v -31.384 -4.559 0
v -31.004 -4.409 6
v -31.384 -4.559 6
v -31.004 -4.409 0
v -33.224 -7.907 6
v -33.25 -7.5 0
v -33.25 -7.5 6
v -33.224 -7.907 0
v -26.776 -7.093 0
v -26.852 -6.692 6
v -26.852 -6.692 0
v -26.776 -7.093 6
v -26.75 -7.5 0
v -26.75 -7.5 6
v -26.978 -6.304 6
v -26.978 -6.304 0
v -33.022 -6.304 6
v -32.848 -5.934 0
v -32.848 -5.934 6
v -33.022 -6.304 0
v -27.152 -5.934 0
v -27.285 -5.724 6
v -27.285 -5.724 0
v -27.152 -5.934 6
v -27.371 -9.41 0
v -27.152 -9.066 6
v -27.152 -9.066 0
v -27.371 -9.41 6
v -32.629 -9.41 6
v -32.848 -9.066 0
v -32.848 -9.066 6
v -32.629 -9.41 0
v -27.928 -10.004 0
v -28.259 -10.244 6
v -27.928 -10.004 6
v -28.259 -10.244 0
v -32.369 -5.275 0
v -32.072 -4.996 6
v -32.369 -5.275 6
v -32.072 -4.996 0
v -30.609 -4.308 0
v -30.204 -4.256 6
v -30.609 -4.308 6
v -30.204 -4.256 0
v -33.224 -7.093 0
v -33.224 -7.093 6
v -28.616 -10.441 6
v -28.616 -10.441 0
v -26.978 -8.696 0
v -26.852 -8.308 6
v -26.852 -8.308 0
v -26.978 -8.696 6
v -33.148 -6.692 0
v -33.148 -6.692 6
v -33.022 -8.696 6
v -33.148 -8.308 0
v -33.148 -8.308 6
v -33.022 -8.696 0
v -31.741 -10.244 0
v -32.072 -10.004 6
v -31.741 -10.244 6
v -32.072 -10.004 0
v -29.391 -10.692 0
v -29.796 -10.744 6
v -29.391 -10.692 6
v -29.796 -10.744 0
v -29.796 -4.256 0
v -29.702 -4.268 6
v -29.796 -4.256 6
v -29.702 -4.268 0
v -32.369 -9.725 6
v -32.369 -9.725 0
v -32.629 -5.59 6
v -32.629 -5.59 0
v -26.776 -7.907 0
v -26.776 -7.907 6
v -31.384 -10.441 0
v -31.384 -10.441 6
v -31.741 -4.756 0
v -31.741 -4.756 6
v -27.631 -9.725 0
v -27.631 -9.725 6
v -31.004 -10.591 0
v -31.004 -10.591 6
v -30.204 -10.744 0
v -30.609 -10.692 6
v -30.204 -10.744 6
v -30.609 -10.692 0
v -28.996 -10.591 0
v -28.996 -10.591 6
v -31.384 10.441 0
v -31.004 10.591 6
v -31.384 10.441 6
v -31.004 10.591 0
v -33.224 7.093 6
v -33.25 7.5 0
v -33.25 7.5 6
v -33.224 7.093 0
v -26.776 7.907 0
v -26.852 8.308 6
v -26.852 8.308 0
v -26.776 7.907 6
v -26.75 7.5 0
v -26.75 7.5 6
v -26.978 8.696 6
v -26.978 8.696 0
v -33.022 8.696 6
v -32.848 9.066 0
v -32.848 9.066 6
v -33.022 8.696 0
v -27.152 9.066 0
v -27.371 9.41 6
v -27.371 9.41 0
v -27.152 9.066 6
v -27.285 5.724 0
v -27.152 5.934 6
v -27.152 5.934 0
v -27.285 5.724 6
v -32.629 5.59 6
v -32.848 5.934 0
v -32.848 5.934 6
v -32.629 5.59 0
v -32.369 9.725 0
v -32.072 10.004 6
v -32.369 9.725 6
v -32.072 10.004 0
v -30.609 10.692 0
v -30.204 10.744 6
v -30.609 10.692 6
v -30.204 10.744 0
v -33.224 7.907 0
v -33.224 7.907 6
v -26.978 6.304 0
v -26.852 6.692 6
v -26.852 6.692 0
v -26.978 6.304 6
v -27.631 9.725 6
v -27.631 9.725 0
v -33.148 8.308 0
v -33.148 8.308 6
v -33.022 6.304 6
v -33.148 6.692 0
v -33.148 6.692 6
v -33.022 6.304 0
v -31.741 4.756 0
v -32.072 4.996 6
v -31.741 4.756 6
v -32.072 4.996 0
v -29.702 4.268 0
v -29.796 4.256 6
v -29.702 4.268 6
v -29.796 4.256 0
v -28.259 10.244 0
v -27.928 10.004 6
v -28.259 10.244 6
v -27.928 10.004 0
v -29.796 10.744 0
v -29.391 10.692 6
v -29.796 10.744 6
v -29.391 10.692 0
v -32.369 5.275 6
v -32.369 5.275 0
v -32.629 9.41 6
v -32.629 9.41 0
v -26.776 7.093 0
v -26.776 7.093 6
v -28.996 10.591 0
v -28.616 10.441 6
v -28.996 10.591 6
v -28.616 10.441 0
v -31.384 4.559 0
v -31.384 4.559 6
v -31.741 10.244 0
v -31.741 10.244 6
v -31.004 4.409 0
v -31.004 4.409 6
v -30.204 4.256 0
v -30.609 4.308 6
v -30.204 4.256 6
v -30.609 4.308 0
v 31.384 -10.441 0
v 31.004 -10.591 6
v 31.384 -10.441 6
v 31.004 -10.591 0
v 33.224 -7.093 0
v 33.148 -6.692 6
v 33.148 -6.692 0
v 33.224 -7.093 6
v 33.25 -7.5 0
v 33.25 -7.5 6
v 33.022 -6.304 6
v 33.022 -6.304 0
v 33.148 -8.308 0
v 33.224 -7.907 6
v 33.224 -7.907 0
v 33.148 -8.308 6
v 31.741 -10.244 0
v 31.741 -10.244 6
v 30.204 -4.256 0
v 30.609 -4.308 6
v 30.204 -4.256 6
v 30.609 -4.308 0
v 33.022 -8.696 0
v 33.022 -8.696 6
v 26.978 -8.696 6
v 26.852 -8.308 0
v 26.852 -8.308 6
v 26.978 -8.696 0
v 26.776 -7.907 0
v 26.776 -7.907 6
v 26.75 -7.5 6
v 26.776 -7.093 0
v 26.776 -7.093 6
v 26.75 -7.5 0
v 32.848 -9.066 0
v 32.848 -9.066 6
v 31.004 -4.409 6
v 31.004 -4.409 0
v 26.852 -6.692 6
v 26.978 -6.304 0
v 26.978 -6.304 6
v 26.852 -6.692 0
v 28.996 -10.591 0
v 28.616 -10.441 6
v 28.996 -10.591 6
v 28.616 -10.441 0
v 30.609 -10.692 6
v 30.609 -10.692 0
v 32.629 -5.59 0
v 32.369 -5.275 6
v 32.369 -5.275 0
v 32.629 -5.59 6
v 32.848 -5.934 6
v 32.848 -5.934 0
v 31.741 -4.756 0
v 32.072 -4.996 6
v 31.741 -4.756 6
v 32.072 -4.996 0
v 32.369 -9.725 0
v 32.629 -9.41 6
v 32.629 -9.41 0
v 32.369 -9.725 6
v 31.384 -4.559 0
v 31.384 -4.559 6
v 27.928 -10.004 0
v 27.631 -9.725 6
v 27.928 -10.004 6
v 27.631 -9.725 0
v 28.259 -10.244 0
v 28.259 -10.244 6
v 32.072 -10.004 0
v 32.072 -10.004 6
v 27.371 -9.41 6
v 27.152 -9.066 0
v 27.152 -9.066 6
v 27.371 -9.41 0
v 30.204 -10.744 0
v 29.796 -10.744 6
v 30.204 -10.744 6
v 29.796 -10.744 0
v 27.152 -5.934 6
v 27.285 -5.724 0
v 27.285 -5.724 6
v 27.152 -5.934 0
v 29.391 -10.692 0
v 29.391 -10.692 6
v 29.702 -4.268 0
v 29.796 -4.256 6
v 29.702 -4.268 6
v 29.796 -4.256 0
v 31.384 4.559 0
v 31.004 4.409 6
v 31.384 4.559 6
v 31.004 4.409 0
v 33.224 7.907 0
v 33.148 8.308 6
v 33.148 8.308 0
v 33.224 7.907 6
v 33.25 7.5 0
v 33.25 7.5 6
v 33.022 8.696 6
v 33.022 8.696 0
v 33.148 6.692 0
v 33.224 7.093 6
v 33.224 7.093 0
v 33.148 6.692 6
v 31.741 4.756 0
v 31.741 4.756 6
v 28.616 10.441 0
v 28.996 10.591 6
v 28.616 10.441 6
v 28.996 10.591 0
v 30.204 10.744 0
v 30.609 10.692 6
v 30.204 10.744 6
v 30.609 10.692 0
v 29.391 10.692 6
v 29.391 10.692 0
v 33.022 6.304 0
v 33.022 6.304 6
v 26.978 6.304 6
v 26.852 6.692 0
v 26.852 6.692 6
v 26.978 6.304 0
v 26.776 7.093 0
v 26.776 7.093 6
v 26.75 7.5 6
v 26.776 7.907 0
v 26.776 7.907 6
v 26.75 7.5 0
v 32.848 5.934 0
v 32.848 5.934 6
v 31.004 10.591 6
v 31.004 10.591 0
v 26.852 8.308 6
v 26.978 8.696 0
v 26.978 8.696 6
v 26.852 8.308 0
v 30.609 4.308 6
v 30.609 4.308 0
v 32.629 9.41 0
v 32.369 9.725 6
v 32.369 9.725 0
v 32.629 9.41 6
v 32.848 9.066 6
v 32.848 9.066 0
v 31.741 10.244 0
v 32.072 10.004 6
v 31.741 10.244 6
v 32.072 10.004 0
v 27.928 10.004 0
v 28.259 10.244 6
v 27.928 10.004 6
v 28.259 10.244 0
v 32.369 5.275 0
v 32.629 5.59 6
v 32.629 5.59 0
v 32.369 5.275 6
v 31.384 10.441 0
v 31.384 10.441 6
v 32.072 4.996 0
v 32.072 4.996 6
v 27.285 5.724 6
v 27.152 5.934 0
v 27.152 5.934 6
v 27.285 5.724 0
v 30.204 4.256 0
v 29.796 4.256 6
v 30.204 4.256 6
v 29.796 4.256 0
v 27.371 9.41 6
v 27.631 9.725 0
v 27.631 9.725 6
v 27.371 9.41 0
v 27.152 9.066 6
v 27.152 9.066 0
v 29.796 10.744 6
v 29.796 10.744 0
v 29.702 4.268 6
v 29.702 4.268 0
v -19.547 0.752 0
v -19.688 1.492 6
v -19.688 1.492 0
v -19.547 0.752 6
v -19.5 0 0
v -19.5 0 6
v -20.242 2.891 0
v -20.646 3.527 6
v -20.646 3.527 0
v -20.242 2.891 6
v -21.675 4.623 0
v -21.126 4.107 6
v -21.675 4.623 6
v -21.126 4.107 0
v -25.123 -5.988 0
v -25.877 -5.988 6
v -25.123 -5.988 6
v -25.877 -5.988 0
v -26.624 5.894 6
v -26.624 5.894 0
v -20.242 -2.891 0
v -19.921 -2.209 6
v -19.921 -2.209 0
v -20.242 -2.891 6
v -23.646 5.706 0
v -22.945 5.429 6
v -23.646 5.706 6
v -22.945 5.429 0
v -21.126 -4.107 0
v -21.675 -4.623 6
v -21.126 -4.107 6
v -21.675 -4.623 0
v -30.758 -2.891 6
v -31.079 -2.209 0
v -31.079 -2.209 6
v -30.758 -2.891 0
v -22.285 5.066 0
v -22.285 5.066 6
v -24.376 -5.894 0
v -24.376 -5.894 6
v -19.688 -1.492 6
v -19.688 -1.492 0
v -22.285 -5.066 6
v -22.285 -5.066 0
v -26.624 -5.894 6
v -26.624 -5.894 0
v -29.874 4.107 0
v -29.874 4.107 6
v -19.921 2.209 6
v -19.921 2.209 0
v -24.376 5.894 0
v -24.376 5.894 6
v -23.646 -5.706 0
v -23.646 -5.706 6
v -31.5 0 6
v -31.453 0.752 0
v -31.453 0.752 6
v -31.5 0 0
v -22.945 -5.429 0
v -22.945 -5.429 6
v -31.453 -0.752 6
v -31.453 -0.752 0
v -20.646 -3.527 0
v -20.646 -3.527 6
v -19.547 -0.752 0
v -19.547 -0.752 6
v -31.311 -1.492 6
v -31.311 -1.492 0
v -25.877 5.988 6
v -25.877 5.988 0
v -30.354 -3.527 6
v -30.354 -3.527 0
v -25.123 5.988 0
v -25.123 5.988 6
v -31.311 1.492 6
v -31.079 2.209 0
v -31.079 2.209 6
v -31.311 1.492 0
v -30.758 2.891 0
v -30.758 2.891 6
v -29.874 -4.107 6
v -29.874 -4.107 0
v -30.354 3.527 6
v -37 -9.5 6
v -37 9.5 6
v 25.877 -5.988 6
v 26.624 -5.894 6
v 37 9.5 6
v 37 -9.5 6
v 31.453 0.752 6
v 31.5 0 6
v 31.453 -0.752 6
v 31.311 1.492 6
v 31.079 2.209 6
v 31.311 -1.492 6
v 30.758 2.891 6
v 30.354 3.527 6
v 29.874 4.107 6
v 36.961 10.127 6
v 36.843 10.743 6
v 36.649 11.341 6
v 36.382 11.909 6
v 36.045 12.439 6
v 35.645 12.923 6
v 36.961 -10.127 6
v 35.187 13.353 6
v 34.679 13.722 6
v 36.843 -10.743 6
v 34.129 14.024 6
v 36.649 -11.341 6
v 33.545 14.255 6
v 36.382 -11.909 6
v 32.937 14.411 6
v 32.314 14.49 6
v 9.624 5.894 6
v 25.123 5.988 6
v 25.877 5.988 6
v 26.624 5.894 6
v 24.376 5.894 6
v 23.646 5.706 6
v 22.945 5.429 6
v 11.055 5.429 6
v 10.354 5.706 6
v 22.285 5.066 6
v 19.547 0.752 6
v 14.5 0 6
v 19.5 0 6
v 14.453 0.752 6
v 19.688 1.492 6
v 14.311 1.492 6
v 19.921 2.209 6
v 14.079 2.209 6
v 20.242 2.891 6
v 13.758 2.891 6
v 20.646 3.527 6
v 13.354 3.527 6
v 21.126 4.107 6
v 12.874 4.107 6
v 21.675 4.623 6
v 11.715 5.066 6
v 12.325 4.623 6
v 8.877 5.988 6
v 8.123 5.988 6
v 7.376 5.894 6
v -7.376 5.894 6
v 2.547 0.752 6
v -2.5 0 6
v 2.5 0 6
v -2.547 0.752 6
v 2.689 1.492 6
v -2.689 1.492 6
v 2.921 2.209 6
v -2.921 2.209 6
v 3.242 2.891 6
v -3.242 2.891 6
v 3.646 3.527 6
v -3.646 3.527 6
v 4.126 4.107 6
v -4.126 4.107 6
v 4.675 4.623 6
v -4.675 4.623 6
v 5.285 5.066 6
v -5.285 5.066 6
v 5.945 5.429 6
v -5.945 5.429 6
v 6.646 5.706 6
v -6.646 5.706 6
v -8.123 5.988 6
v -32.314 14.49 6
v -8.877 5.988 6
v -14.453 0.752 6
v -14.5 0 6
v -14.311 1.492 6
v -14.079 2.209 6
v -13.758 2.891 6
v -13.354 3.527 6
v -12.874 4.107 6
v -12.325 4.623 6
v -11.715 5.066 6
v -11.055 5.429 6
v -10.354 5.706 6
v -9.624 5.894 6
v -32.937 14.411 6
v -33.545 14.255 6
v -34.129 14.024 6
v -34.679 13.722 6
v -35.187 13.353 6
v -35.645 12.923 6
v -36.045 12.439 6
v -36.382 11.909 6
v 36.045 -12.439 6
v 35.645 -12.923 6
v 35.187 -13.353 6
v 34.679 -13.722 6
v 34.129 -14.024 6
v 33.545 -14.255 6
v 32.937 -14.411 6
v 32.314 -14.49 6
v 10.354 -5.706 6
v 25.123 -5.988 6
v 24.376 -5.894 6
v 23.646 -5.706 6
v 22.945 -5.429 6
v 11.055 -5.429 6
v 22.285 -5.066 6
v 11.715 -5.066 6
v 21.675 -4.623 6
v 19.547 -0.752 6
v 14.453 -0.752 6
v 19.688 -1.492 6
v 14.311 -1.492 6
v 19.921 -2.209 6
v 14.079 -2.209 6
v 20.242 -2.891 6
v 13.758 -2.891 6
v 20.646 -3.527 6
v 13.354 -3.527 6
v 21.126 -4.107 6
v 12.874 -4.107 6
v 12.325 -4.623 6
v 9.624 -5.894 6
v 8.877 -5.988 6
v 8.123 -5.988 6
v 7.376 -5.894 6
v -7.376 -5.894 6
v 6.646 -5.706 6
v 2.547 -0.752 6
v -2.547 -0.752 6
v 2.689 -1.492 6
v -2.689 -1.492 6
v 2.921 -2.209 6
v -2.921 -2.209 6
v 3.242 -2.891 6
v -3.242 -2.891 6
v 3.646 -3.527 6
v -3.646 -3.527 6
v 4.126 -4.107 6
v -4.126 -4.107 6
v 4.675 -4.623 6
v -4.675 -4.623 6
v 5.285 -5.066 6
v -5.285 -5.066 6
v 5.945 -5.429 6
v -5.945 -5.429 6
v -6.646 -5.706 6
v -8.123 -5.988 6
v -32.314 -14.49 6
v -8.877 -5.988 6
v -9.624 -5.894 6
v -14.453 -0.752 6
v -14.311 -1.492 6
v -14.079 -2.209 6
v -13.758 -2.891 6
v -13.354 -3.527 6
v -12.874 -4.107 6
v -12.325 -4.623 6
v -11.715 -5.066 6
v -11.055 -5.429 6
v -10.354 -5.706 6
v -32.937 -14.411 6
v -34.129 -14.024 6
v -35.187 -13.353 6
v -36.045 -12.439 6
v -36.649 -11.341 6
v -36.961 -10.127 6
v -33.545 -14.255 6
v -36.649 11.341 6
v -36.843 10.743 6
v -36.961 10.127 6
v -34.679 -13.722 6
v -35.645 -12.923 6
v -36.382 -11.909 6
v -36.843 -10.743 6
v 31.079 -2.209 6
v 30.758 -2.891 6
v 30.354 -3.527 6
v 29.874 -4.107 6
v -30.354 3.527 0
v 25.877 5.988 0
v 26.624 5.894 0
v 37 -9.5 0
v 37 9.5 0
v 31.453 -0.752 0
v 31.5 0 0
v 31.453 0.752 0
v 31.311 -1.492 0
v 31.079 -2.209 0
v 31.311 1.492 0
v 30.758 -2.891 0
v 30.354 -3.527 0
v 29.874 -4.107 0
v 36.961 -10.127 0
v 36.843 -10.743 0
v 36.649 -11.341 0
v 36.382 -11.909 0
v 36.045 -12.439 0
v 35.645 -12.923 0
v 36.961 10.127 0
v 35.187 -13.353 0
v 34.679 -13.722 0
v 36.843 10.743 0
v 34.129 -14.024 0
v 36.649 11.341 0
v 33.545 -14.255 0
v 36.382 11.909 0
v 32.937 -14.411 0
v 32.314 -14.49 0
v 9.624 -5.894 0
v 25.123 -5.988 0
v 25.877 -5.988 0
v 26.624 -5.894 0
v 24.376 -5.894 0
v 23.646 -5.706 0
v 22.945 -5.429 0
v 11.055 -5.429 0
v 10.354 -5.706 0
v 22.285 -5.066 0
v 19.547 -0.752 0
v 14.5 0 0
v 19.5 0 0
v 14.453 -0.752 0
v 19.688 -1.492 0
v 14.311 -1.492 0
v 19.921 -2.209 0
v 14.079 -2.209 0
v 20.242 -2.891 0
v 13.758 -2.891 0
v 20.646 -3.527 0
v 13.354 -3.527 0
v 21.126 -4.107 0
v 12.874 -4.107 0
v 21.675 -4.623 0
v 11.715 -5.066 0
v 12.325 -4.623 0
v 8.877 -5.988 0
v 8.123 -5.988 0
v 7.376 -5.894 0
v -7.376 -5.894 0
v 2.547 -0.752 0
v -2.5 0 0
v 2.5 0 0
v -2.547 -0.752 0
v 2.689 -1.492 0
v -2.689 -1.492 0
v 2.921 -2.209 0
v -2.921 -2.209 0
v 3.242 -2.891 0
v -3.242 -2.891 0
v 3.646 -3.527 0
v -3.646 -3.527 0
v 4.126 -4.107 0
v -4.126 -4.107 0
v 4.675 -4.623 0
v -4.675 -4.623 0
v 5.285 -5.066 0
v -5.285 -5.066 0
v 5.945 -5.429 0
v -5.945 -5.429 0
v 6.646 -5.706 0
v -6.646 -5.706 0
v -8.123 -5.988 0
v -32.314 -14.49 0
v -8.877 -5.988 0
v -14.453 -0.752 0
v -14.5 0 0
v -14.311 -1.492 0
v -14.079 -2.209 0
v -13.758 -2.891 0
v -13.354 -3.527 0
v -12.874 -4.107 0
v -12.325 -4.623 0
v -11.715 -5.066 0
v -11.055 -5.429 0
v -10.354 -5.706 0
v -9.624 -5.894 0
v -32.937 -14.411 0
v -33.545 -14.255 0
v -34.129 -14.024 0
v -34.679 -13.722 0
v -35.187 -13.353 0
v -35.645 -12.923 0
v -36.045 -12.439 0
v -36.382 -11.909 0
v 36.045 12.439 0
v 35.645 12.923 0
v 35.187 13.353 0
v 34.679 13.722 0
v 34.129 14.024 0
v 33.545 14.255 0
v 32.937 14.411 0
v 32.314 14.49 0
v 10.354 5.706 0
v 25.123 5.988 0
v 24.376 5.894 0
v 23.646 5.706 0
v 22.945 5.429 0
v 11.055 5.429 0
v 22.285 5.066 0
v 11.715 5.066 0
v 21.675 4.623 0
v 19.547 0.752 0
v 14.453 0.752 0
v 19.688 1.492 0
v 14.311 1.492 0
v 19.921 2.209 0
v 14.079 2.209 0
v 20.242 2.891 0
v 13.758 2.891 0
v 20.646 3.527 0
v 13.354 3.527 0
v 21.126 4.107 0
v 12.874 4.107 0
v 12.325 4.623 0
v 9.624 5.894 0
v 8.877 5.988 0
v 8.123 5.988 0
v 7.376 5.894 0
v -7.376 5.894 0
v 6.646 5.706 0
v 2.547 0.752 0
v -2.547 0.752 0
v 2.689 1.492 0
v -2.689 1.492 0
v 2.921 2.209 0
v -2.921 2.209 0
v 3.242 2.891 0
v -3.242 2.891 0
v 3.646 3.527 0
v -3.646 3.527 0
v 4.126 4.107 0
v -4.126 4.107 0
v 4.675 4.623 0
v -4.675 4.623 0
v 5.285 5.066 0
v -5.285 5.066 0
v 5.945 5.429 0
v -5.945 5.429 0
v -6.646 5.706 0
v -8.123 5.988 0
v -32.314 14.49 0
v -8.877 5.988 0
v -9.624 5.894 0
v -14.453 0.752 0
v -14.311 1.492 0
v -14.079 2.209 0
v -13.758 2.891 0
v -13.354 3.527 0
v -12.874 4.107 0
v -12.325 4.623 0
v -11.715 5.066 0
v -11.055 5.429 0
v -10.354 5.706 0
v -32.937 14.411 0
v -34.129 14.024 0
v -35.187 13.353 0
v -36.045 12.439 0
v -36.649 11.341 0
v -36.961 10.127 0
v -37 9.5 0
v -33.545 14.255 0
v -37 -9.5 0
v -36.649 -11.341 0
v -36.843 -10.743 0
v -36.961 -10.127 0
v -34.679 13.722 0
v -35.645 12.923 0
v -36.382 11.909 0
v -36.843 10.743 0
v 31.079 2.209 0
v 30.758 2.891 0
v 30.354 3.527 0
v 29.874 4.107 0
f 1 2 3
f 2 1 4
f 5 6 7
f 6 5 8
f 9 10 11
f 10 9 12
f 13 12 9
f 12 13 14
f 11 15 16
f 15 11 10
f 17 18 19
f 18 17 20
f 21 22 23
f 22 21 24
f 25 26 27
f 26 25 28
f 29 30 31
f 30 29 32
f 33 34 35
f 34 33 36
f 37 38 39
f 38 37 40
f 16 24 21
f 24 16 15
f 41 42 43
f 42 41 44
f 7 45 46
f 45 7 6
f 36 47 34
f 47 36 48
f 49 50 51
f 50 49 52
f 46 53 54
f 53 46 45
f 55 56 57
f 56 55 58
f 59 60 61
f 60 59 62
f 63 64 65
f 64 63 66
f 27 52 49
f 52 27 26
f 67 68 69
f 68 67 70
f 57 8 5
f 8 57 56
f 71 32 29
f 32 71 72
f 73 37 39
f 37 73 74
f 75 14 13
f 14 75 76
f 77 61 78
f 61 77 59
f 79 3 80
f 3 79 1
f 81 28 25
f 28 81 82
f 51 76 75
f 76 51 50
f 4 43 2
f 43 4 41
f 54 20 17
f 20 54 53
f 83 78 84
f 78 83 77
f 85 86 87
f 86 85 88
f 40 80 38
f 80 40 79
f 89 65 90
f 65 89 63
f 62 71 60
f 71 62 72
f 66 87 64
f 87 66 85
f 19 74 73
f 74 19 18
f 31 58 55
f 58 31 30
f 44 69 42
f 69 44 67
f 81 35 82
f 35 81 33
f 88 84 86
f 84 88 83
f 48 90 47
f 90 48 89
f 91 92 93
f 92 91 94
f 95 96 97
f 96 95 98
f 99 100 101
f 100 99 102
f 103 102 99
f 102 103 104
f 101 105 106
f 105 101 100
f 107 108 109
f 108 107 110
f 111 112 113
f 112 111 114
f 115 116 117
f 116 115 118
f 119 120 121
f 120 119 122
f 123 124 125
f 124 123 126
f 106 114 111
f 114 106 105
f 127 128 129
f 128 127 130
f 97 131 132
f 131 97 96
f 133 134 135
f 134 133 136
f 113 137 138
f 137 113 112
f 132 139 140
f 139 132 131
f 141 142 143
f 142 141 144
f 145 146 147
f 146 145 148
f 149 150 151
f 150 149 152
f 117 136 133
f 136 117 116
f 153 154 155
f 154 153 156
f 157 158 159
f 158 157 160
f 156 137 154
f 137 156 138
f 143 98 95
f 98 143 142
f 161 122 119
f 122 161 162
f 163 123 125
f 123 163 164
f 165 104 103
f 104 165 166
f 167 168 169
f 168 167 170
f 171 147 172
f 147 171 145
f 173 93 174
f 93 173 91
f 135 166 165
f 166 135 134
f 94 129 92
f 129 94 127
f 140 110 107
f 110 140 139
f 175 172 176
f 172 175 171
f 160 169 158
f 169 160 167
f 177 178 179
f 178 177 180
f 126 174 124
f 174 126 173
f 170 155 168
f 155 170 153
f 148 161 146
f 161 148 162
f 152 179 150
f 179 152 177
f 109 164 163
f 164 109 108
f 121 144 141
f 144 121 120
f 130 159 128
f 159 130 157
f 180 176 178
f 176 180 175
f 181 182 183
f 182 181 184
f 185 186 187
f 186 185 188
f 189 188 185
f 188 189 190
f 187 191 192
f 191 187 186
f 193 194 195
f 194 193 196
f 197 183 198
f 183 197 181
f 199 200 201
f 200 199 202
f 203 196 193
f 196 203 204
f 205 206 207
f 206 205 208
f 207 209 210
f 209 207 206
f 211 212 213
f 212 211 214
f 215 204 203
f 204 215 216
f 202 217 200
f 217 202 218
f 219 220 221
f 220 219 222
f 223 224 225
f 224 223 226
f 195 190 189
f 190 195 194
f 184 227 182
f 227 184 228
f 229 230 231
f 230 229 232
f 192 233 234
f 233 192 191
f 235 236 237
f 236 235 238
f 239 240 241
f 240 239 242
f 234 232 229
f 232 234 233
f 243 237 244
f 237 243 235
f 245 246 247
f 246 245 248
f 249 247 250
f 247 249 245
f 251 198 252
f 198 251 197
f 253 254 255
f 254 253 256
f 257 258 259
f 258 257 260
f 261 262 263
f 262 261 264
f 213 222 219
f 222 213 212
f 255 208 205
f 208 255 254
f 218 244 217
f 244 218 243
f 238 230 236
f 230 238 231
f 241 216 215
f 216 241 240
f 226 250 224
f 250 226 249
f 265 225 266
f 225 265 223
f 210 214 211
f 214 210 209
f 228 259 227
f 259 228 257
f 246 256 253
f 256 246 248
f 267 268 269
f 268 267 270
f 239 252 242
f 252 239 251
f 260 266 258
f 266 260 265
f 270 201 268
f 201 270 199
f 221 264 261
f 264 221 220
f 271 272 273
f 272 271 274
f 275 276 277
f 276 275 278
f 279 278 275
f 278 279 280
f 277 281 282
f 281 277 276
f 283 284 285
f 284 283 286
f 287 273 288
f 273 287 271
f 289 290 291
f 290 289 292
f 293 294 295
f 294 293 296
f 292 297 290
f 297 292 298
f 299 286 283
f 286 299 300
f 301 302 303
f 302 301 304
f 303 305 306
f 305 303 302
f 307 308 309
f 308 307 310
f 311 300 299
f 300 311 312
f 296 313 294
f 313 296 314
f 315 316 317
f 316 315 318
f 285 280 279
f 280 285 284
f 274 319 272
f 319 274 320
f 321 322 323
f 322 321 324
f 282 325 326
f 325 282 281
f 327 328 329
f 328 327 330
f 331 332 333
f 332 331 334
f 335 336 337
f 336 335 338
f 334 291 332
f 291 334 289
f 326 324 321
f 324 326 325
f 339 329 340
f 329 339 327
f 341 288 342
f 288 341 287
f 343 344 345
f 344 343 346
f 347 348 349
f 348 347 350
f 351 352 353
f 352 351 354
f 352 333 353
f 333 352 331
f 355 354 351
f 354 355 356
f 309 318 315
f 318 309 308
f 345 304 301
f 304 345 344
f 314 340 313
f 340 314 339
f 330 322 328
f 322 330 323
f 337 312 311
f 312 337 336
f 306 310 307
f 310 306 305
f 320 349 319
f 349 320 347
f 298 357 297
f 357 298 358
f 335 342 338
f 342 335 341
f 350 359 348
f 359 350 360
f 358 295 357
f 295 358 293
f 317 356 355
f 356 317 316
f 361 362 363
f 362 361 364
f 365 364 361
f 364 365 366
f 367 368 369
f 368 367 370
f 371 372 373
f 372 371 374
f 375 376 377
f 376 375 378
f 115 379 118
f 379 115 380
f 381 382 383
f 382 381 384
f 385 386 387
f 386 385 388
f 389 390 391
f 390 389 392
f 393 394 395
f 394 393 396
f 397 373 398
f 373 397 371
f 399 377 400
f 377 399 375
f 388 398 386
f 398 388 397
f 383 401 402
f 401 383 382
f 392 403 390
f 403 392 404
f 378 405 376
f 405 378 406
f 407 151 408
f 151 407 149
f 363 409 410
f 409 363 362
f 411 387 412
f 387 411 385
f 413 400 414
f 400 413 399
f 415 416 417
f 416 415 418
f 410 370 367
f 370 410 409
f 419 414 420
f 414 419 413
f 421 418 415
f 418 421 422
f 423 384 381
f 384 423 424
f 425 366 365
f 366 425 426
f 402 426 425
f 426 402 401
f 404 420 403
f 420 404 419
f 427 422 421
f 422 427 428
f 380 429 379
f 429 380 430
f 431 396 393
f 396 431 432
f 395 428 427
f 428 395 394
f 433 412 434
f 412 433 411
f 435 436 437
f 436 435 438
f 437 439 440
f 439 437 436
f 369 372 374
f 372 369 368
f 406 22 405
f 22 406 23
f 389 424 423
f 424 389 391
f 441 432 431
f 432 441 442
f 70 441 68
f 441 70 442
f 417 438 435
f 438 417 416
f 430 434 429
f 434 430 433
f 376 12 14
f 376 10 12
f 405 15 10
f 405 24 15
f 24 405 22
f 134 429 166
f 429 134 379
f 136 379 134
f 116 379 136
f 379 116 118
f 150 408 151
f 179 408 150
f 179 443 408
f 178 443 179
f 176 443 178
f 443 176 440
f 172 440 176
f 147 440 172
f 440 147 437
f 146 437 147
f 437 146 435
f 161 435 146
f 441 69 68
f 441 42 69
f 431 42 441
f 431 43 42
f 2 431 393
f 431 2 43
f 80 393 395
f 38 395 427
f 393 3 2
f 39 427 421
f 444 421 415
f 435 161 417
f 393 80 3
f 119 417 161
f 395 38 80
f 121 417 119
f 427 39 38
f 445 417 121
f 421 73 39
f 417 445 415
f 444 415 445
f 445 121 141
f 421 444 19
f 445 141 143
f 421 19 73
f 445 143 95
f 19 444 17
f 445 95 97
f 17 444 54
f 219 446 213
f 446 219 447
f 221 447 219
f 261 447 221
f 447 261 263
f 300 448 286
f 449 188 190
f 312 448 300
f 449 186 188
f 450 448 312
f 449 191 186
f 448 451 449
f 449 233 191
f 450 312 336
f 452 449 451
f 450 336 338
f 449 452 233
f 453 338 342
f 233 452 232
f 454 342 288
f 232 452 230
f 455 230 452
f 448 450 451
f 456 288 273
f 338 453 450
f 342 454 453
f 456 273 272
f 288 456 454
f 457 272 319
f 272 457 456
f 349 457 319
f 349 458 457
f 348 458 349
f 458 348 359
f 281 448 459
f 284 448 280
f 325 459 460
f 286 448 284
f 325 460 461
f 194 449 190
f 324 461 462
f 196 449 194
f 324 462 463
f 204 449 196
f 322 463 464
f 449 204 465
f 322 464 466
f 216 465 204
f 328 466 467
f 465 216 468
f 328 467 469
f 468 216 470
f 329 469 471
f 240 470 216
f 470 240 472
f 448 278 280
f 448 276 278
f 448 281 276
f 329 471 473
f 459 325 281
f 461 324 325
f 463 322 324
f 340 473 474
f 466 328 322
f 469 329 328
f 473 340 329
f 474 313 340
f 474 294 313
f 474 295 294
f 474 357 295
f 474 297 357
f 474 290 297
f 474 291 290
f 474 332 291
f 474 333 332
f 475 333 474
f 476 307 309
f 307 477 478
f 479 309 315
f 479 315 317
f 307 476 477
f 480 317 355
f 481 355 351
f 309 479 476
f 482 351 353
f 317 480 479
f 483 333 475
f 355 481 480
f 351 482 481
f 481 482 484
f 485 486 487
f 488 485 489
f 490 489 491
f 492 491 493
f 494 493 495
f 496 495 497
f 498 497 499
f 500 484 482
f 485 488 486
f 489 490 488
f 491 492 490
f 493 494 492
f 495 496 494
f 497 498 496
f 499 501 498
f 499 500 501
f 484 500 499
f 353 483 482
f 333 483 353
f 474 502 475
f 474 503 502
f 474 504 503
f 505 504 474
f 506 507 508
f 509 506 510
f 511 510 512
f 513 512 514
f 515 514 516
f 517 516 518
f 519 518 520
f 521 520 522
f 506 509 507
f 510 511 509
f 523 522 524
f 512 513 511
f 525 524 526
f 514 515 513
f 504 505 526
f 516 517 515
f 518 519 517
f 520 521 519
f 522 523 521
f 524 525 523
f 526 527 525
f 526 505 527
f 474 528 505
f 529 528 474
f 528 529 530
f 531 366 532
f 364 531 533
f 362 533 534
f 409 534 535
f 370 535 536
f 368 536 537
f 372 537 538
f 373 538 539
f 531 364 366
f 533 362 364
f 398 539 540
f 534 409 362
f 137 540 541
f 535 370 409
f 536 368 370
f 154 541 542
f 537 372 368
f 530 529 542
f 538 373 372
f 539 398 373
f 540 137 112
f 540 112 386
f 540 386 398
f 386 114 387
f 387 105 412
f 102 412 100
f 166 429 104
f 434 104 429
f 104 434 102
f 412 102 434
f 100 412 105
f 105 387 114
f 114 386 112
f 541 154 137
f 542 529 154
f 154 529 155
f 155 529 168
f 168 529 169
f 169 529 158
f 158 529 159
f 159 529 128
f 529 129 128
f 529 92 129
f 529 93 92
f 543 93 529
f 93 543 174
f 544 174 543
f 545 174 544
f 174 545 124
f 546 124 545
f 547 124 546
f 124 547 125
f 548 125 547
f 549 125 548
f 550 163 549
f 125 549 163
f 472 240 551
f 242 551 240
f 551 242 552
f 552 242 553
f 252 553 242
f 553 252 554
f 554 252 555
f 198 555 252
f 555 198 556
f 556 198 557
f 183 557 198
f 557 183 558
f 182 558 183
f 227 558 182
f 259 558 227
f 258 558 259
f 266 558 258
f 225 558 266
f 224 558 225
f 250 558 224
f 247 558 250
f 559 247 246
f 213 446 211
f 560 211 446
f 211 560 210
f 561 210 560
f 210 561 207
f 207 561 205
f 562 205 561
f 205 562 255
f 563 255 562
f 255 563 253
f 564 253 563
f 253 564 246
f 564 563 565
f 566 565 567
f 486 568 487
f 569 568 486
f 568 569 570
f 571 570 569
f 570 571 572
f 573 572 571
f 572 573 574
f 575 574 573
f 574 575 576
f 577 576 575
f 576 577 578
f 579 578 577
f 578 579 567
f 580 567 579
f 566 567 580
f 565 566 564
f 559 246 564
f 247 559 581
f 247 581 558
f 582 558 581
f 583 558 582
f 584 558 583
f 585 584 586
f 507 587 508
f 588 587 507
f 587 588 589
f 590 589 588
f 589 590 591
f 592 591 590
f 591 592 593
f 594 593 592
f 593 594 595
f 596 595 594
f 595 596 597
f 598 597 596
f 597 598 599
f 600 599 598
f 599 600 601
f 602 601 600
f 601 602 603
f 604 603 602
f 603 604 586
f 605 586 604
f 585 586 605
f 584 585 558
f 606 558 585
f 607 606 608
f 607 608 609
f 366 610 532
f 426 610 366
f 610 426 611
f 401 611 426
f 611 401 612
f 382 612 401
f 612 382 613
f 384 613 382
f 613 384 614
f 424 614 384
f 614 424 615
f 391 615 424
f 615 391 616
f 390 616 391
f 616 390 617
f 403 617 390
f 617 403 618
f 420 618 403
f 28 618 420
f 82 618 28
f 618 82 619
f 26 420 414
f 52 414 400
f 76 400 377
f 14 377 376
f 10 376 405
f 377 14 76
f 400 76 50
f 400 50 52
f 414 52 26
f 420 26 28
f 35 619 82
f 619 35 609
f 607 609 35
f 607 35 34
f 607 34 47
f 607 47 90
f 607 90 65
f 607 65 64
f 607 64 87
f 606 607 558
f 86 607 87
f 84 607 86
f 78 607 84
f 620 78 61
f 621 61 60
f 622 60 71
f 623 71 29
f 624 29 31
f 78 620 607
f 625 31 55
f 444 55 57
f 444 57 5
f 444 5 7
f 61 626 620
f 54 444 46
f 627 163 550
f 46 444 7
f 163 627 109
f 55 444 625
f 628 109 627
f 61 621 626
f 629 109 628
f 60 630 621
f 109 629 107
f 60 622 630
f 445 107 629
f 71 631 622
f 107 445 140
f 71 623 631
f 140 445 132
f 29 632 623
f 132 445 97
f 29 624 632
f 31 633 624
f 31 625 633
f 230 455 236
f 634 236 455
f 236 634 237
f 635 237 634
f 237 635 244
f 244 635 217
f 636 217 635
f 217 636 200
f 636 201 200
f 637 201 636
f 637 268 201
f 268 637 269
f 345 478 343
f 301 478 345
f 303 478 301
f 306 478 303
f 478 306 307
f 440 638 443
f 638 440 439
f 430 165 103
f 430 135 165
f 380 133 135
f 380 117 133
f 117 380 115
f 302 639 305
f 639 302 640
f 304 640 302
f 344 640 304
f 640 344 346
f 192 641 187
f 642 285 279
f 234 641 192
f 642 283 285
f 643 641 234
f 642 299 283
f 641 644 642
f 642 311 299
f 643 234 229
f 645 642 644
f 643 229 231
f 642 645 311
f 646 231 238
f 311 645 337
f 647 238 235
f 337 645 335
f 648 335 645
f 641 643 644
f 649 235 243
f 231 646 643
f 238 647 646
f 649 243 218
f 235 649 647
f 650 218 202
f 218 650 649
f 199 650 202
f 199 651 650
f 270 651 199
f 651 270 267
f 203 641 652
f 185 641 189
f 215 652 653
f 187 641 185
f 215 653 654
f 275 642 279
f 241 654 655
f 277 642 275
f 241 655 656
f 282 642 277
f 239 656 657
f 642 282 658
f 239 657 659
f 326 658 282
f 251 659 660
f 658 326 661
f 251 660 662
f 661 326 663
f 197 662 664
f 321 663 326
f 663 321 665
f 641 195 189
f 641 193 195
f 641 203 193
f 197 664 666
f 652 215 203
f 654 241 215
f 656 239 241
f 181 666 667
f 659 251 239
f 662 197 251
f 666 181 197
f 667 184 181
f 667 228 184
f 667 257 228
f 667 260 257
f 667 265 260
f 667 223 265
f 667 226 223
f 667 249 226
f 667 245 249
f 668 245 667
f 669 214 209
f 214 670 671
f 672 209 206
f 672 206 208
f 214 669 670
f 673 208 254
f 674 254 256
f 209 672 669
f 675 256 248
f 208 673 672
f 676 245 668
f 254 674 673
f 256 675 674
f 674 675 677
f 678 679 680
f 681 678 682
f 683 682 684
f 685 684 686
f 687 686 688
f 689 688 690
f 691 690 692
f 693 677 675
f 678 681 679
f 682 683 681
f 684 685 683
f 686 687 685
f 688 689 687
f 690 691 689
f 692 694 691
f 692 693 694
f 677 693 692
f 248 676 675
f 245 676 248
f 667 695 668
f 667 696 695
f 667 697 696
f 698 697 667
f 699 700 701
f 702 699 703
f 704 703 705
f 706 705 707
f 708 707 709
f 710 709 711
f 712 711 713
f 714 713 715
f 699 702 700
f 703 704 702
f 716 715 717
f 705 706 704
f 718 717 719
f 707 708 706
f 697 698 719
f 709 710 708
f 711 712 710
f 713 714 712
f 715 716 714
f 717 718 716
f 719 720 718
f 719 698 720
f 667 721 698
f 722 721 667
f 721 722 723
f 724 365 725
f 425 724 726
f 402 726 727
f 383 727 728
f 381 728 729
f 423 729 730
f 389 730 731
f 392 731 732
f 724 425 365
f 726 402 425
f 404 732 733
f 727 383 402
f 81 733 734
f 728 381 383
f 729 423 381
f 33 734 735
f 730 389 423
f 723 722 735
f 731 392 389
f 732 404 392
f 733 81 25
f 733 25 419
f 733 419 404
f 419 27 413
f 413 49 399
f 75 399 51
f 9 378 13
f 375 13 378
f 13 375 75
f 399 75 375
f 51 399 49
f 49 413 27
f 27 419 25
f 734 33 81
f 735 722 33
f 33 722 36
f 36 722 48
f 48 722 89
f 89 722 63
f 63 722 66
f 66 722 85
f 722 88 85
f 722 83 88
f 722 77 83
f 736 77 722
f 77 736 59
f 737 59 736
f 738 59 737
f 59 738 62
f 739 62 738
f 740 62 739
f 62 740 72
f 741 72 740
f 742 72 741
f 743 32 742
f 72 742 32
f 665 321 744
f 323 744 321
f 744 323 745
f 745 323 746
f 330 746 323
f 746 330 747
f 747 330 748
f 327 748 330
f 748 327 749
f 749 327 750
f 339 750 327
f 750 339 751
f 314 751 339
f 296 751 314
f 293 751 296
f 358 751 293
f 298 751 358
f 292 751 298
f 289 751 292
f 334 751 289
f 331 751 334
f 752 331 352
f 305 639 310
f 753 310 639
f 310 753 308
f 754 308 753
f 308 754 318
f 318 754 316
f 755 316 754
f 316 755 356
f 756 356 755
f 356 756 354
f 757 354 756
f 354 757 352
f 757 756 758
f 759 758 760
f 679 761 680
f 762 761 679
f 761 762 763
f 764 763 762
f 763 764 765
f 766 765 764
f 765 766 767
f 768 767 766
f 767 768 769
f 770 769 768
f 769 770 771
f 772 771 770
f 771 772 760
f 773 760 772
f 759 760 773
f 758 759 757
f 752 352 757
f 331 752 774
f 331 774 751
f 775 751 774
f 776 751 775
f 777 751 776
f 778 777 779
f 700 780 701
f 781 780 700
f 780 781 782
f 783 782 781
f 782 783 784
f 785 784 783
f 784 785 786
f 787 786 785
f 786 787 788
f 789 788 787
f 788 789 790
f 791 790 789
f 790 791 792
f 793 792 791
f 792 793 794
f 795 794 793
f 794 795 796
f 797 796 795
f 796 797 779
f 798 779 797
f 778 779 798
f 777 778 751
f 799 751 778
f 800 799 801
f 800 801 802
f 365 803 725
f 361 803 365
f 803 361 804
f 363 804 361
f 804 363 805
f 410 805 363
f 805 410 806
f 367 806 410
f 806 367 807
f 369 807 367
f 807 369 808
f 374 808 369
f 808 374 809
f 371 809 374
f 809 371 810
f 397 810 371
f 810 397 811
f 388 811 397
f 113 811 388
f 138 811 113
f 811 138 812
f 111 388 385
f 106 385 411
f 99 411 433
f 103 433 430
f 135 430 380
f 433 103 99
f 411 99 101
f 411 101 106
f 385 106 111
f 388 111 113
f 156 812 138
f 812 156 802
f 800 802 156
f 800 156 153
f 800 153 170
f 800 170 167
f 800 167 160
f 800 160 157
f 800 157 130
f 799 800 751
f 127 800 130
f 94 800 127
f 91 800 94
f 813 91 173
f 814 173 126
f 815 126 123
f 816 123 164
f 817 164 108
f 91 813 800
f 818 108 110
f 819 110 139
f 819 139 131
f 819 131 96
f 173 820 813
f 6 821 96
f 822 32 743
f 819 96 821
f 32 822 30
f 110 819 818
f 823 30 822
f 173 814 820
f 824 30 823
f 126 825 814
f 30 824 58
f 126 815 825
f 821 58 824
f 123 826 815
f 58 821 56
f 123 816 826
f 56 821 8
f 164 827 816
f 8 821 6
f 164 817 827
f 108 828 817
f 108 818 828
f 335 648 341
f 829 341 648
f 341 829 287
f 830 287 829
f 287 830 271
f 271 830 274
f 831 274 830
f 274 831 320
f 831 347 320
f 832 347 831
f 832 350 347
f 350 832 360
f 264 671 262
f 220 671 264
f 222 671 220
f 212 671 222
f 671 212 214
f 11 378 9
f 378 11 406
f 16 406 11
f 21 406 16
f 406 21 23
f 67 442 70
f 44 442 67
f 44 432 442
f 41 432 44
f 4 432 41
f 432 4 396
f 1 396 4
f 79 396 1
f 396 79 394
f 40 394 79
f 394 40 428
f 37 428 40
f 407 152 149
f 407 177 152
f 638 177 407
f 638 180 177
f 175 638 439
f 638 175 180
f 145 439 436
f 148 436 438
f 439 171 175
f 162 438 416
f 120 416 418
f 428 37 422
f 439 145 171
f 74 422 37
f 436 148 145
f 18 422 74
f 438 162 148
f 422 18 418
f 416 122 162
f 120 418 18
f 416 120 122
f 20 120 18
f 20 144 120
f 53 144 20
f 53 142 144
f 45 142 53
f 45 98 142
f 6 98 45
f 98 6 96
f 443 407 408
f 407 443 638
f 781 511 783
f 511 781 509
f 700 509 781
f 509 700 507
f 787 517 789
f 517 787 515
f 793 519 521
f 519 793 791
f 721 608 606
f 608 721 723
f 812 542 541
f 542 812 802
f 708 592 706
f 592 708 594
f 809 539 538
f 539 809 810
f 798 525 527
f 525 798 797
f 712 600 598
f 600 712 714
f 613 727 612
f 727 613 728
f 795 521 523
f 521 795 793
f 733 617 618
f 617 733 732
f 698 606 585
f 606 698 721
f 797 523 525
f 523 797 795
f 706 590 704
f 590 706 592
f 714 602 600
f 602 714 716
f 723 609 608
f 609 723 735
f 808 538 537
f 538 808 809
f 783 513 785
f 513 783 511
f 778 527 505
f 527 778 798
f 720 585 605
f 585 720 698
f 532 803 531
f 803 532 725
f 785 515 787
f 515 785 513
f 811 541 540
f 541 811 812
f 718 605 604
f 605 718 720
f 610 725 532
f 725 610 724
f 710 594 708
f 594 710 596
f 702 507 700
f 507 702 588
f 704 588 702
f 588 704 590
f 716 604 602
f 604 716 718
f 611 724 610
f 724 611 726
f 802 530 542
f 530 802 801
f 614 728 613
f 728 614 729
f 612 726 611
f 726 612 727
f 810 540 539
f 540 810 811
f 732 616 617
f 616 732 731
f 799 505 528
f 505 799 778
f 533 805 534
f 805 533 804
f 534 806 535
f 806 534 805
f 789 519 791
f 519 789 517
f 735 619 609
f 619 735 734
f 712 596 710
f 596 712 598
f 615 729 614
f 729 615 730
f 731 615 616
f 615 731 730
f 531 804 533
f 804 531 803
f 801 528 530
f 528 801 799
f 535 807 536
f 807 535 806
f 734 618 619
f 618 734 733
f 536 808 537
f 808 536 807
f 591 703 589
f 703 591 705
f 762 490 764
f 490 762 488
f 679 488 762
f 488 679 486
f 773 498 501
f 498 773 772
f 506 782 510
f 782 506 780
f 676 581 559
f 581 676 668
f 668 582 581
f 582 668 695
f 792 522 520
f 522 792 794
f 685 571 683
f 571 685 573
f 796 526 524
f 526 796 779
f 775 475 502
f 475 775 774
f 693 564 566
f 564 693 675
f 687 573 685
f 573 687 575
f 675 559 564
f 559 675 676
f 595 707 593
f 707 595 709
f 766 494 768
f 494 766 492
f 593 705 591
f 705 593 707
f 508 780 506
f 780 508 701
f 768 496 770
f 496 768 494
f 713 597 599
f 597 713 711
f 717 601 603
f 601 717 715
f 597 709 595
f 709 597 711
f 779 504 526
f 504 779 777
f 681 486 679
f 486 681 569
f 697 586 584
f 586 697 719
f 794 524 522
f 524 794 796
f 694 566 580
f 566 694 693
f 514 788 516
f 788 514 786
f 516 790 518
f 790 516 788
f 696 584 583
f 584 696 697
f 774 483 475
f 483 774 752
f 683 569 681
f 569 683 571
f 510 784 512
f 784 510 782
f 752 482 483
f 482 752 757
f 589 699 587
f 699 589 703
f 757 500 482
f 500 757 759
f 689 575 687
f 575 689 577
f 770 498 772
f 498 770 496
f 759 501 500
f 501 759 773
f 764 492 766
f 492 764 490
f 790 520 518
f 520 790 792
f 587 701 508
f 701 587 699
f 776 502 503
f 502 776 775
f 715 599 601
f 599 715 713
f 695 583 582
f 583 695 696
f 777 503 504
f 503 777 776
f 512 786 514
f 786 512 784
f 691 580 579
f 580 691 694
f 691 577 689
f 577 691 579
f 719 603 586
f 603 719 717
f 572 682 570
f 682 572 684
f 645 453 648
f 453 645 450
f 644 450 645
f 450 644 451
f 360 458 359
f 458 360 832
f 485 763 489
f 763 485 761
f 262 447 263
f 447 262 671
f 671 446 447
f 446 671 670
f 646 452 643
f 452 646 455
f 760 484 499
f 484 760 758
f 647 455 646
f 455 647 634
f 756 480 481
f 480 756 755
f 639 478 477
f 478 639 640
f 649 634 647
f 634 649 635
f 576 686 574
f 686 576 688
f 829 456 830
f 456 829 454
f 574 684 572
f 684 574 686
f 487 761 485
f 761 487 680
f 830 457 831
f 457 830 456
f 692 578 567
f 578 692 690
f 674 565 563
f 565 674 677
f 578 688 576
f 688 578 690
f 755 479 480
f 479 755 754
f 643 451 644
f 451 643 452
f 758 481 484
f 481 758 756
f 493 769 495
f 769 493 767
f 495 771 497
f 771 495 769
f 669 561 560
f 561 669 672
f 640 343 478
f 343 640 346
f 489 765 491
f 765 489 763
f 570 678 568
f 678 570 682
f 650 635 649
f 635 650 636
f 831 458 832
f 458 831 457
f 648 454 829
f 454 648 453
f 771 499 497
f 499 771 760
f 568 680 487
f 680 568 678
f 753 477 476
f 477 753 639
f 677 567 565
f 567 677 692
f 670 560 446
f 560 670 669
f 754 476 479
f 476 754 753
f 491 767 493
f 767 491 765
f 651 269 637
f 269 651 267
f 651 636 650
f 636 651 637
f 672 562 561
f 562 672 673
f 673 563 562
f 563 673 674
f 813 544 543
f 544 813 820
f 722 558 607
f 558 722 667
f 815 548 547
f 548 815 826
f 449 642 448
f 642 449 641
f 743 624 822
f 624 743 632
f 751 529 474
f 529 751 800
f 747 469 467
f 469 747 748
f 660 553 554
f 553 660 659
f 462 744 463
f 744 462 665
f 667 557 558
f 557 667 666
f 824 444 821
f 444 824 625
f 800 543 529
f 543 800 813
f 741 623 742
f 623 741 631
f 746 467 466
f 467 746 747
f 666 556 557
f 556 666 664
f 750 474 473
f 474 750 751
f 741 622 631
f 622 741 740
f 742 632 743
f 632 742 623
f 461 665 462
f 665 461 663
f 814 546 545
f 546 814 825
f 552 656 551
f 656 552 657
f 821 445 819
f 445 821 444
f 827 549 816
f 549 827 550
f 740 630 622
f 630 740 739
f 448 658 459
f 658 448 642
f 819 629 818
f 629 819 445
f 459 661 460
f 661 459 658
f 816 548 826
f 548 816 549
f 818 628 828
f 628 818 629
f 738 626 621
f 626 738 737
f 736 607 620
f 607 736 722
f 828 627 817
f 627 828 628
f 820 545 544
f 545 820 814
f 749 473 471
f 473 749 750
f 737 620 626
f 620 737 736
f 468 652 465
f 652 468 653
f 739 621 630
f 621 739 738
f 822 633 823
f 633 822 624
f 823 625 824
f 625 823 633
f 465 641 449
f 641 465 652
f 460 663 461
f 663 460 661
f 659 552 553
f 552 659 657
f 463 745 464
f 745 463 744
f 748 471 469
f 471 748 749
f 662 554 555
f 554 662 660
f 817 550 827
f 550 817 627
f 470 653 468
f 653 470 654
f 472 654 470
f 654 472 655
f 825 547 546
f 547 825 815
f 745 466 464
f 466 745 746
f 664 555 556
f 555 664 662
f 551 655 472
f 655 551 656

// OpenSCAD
$fn = 50;

difference() {
	union() {
		hull() {
			translate(v = [-32.0, 9.5, 0]) {
				cylinder(h = 6, r = 5);
			}
			translate(v = [32.0, 9.5, 0]) {
				cylinder(h = 6, r = 5);
			}
			translate(v = [-32.0, -9.5, 0]) {
				cylinder(h = 6, r = 5);
			}
			translate(v = [32.0, -9.5, 0]) {
				cylinder(h = 6, r = 5);
			}
		}
	}
	union() {
		translate(v = [-30.0, -7.5, -100.0]) {
			cylinder(h = 200, r = 3.25);
		}
		translate(v = [-30.0, 7.5, -100.0]) {
			cylinder(h = 200, r = 3.25);
		}
		translate(v = [30.0, -7.5, -100.0]) {
			cylinder(h = 200, r = 3.25);
		}
		translate(v = [30.0, 7.5, -100.0]) {
			cylinder(h = 200, r = 3.25);
		}
		translate(v = [-30.0, -7.5, -100.0]) {
			cylinder(h = 200, r = 1.8);
		}
		translate(v = [-30.0, 7.5, -100.0]) {
			cylinder(h = 200, r = 1.8);
		}
		translate(v = [30.0, -7.5, -100.0]) {
			cylinder(h = 200, r = 1.8);
		}
		translate(v = [30.0, 7.5, -100.0]) {
			cylinder(h = 200, r = 1.8);
		}
		translate(v = [-25.5, 0, 0.0]) {
			cylinder(h = 6, r = 6.0);
		}
		translate(v = [-8.5, 0, 0.0]) {
			cylinder(h = 6, r = 6.0);
		}
		translate(v = [8.5, 0, 0.0]) {
			cylinder(h = 6, r = 6.0);
		}
		translate(v = [25.5, 0, 0.0]) {
			cylinder(h = 6, r = 6.0);
		}
	}
}
